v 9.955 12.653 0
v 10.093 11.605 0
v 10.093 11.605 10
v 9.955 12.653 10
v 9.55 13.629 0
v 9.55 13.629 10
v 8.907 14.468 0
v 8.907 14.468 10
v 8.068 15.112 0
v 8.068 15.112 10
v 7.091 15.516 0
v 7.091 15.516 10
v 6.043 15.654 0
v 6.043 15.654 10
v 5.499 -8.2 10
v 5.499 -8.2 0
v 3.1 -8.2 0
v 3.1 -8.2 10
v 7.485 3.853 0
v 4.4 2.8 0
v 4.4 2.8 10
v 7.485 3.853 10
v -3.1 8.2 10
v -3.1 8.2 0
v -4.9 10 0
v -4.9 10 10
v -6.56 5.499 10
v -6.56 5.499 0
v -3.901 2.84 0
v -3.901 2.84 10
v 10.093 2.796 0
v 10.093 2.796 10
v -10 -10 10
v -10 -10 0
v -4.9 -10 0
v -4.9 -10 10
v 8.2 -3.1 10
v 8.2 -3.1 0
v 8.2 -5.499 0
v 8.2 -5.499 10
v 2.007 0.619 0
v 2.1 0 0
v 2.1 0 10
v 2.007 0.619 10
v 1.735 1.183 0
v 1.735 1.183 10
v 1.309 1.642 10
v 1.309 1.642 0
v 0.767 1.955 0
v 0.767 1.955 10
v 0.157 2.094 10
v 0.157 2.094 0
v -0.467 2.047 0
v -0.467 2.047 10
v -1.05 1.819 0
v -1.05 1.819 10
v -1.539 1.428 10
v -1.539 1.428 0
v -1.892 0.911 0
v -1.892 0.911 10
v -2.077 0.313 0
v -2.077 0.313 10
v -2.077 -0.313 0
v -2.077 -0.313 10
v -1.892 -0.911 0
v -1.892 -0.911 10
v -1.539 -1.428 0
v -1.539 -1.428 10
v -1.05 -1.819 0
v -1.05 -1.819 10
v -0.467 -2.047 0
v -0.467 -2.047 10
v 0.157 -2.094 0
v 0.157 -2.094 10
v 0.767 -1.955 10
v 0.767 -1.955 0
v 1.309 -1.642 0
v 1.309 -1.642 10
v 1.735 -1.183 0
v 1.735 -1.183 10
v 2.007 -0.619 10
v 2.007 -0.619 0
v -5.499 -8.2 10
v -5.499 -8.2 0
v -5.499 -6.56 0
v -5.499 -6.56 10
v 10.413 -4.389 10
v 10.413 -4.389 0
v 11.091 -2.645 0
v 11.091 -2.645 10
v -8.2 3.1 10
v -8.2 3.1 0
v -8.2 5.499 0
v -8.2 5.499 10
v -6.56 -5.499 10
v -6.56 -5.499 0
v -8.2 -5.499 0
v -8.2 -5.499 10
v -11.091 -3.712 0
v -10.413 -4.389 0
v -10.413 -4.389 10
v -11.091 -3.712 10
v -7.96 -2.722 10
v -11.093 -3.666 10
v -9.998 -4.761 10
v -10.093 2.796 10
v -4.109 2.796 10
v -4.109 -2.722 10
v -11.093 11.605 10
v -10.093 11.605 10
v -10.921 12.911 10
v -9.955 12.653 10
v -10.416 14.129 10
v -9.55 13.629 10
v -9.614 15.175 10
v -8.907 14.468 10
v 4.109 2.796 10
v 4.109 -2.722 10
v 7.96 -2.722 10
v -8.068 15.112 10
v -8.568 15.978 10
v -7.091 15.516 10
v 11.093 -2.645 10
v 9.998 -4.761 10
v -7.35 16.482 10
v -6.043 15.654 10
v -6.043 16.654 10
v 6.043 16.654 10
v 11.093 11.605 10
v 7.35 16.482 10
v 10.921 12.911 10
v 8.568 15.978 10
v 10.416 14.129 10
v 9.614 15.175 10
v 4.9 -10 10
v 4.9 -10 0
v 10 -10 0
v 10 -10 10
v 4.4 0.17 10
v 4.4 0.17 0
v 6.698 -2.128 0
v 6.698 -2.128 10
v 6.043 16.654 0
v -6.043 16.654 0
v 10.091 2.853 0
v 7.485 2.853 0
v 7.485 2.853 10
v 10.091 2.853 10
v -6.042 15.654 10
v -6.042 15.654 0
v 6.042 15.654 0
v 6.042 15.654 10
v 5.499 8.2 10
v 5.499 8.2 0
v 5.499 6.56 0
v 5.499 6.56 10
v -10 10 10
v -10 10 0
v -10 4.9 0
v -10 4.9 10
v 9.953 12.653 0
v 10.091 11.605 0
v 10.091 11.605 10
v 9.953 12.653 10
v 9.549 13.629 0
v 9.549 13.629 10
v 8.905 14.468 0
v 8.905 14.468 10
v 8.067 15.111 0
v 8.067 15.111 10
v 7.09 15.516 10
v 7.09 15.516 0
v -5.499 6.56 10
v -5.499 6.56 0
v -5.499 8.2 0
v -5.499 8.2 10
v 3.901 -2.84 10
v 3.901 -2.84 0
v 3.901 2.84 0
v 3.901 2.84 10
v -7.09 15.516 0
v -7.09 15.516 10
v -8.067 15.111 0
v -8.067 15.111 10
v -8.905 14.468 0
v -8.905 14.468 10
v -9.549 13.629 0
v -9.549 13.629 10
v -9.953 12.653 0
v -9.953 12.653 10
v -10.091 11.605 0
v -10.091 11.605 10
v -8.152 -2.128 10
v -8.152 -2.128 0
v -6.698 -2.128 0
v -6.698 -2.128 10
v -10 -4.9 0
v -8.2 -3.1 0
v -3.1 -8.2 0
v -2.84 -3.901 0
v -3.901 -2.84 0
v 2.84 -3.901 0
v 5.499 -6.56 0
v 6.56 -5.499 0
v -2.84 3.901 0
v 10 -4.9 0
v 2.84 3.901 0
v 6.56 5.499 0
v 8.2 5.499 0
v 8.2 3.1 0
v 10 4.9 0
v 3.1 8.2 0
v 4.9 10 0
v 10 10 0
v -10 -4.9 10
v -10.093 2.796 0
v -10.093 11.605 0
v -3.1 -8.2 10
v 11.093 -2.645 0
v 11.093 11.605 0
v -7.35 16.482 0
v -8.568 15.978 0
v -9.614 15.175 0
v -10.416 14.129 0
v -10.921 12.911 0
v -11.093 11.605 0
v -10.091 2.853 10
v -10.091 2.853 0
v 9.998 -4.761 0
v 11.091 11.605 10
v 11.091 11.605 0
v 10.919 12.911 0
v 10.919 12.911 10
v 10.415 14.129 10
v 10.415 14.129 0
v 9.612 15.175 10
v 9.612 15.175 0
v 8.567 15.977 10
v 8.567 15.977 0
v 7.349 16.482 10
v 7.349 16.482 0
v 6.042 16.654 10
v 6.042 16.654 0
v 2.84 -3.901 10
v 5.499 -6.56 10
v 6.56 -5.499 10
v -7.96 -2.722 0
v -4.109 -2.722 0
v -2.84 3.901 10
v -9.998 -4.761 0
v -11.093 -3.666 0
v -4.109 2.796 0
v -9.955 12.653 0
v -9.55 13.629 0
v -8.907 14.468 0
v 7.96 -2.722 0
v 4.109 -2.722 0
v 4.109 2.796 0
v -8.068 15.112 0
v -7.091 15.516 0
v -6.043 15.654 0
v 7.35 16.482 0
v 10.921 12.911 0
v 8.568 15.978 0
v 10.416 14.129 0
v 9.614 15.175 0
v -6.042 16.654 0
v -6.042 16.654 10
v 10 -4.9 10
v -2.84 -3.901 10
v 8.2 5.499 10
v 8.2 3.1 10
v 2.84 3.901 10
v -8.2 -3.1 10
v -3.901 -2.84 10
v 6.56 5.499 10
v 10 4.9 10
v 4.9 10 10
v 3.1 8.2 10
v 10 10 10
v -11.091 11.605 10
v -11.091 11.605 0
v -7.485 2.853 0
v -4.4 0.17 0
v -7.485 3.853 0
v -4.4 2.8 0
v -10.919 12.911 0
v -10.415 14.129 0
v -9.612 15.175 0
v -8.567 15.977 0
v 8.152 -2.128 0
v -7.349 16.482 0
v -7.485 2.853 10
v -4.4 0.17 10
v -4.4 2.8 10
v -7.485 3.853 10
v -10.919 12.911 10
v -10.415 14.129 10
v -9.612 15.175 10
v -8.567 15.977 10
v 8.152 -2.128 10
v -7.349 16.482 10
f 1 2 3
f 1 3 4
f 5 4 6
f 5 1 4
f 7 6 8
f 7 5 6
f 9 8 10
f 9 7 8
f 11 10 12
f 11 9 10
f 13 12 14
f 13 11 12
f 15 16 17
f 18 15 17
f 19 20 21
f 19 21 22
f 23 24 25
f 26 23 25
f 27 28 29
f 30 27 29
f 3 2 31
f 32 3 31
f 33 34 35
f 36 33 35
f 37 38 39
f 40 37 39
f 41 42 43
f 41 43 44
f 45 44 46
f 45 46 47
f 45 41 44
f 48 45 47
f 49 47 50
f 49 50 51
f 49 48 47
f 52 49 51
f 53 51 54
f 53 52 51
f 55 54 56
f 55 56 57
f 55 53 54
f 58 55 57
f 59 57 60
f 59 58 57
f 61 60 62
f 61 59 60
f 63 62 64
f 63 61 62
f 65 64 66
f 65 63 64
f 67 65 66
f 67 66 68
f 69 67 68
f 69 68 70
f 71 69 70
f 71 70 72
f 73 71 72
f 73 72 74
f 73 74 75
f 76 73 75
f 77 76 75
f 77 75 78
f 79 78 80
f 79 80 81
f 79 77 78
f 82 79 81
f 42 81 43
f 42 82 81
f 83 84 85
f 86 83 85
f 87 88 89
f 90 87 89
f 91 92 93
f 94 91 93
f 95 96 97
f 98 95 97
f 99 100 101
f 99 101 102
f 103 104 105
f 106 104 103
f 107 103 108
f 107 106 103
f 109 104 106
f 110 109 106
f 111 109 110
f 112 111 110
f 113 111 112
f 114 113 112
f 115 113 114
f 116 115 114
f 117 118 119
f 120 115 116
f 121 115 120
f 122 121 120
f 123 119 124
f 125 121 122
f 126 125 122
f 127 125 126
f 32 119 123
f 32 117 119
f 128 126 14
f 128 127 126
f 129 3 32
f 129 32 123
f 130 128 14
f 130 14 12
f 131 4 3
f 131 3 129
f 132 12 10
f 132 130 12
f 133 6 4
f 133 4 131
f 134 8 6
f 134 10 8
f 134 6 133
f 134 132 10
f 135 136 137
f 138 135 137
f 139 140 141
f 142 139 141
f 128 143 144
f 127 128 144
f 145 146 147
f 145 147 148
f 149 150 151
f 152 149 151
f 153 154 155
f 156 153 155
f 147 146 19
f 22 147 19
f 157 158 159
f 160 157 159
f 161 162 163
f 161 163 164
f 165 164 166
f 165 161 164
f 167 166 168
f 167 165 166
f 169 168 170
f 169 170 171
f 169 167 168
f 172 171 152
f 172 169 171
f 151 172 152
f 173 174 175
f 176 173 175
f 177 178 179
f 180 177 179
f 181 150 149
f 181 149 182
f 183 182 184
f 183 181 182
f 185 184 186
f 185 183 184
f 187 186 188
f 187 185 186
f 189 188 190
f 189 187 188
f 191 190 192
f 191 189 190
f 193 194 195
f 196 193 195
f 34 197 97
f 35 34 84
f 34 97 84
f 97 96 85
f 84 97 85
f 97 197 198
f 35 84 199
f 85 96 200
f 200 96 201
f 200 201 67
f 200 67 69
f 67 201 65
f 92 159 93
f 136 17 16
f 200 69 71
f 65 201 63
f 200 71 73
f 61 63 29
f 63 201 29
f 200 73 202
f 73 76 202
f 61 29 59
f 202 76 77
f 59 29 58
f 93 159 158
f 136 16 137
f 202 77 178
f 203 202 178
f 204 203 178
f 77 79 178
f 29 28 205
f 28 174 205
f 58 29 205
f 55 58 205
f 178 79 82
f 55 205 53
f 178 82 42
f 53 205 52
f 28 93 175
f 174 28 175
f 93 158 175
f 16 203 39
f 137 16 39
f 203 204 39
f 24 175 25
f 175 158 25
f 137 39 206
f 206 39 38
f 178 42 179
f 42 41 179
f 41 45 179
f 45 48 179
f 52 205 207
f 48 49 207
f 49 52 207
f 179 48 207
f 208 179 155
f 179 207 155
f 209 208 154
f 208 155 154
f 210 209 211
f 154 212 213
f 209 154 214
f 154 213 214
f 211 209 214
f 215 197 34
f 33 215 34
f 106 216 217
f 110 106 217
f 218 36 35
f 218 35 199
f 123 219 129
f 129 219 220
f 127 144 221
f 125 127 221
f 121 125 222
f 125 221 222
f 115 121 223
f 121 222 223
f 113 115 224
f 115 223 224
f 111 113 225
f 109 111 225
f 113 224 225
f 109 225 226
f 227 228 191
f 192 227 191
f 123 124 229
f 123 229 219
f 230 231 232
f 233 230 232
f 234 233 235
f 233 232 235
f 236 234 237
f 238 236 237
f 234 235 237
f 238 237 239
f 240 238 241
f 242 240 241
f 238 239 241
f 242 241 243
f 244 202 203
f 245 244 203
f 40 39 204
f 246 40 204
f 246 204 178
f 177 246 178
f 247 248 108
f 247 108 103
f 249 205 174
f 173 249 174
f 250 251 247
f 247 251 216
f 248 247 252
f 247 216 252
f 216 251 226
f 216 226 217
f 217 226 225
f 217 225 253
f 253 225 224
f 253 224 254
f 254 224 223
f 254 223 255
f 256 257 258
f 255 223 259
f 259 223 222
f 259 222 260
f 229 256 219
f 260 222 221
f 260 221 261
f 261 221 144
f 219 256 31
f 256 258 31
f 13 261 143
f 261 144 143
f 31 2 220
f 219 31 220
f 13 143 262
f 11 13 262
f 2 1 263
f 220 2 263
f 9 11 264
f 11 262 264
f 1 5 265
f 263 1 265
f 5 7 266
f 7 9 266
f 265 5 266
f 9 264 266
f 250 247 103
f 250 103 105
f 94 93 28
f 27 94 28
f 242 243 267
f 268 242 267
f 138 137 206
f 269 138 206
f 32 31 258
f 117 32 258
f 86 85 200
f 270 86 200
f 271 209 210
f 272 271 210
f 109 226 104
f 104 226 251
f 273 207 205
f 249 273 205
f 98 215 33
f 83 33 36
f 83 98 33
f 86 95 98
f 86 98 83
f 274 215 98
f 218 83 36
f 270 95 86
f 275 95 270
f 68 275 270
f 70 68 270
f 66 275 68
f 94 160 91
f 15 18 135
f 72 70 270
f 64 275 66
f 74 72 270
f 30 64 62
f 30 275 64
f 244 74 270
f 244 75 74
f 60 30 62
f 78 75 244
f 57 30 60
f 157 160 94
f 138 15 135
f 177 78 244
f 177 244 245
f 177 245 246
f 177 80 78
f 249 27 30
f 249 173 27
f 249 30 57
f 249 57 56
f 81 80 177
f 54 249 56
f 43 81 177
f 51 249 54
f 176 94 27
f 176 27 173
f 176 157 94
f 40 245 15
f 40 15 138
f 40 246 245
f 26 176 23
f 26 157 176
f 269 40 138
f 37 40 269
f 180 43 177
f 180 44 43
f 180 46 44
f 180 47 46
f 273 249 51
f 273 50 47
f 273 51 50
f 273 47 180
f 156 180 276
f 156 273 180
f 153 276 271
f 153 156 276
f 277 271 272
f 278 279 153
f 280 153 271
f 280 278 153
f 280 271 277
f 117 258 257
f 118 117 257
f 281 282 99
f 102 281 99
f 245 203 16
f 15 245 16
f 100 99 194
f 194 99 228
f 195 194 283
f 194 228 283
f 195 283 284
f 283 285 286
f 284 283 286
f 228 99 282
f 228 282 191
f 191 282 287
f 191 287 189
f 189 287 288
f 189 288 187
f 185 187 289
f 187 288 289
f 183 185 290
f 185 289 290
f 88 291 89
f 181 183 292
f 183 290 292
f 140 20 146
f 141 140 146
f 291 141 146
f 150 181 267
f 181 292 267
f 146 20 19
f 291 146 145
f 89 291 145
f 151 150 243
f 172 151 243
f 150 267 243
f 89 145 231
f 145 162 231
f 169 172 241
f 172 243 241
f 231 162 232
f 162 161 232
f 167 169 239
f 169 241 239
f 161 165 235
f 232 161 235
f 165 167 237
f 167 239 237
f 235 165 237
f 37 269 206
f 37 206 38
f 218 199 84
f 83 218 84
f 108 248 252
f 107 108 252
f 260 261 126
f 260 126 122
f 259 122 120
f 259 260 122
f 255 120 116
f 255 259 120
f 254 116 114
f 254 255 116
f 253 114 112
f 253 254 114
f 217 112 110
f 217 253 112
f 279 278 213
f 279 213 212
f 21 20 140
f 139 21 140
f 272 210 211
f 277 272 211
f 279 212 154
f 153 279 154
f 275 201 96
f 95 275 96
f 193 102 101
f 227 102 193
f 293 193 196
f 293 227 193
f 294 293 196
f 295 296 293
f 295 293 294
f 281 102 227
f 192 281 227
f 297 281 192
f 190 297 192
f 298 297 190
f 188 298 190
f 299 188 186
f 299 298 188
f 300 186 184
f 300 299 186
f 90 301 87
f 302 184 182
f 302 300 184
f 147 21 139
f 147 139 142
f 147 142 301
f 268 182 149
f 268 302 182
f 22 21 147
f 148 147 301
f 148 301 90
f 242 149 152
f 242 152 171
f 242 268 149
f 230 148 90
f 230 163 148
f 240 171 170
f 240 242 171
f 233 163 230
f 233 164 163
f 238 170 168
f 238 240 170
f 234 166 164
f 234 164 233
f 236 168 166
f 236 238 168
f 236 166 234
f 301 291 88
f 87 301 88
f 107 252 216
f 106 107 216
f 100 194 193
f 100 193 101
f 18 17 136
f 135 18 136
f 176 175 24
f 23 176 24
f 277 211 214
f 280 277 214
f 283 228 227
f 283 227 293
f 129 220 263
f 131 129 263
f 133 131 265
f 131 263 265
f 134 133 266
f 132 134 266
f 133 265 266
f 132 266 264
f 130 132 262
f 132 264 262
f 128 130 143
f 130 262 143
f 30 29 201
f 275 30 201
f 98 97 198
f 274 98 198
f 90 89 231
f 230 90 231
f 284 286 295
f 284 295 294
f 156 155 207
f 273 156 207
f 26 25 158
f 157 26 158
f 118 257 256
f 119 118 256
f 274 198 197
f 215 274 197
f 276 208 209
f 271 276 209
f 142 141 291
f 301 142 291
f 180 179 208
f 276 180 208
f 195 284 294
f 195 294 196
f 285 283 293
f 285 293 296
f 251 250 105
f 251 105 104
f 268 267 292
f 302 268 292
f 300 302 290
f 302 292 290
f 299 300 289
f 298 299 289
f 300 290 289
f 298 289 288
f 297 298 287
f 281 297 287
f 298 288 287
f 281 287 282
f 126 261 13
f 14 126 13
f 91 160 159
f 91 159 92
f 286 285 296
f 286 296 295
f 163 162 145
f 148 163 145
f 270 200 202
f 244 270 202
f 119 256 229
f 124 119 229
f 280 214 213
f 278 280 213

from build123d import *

# Parameters (mm, degrees)
SKETCH_R      = 2.1
EXTRUDE_DEPTH = 10
PAD_DEPTH     = 10
PAD001_DEPTH  = 10


with BuildPart() as extrude_body:
    # Sketch → Extrude (new body)
    with BuildSketch(Plane.XY):
        Polygon((-2.84, 3.90066), (-5.49934, 6.56), (-5.49934, 8.2), (-3.1, 8.2), (-4.9, 10), (-10, 10), (-10, 4.9), (-8.2, 3.1), (-8.2, 5.49934), (-6.56, 5.49934), (-3.90066, 2.84), (-3.90066, 0), (-3.90066, -2.84), (-6.56, -5.49934), (-8.2, -5.49934), (-8.2, -3.1), (-10, -4.9), (-10, -10), (-4.9, -10), (-3.1, -8.2), (-5.49934, -8.2), (-5.49934, -6.56), (-2.84, -3.90066), (0, -3.90066), (2.84, -3.90066), (5.49934, -6.56), (5.49934, -8.2), (3.1, -8.2), (4.9, -10), (10, -10), (10, -4.9), (8.2, -3.1), (8.2, -5.49934), (6.56, -5.49934), (3.90066, -2.84), (3.90066, 0), (3.90066, 2.84), (6.56, 5.49934), (8.2, 5.49934), (8.2, 3.1), (10, 4.9), (10, 10), (4.9, 10), (3.1, 8.2), (5.49934, 8.2), (5.49934, 6.56), (2.84, 3.90066), (0, 3.90066), align=None)
        Circle(SKETCH_R, mode=Mode.SUBTRACT)
    extrude(amount=EXTRUDE_DEPTH)


with BuildPart() as body:
    # Sketch001 → Pad (new body)
    with BuildSketch(Plane.XY):
        with BuildLine():
            Line((-4.109357, 2.795605), (-10.092726, 2.795605))
            Line((-10.092726, 2.795605), (-10.092726, 11.604547))
            ThreePointArc((-6.043087, 15.654186), (-8.906614, 14.468074), (-10.092726, 11.604547))
            Line((-6.043087, 15.654186), (6.043087, 15.654186))
            ThreePointArc((10.092726, 11.604547), (8.906614, 14.468074), (6.043087, 15.654186))
            Line((10.092726, 11.604547), (10.092726, 2.795605))
            Line((10.092726, 2.795605), (4.109357, 2.795605))
            Line((4.109357, 2.795605), (4.109357, -2.722318))
            Line((4.109357, -2.722318), (7.960155, -2.722318))
            Line((7.960155, -2.722318), (9.998449, -4.760612))
            Line((9.998449, -4.760612), (11.092726, -2.644745))
            Line((11.092726, -2.644745), (11.092726, 11.604547))
            ThreePointArc((11.092726, 11.604547), (9.613721, 15.175181), (6.043087, 16.654186))
            Line((6.043087, 16.654186), (-6.043087, 16.654186))
            ThreePointArc((-6.043087, 16.654186), (-9.613721, 15.175181), (-11.092726, 11.604547))
            Line((-11.092726, 11.604547), (-11.092726, -3.666335))
            Line((-9.998449, -4.760612), (-11.092726, -3.666335))
            Line((-7.960155, -2.722318), (-9.998449, -4.760612))
            Line((-4.109357, -2.722318), (-7.960155, -2.722318))
            Line((-4.109357, -2.722318), (-4.109357, 2.795605))
        make_face()
    extrude(amount=PAD_DEPTH)


with BuildPart() as body001:
    # Sketch002 → Pad001 (new body)
    with BuildSketch(Plane.XY):
        with BuildLine():
            Line((-10.09111, 2.853201), (-10.09111, 11.604758))
            ThreePointArc((-6.042314, 15.653553), (-8.905245, 14.467688), (-10.09111, 11.604758))
            Line((-6.042314, 15.653553), (6.042314, 15.653553))
            ThreePointArc((10.09111, 11.604758), (8.905245, 14.467688), (6.042314, 15.653553))
            Line((10.09111, 11.604758), (10.09111, 2.853201))
            Line((7.485281, 2.853201), (10.09111, 2.853201))
            Line((7.485281, 2.853201), (7.485281, 3.853201))
            Line((4.4, 2.8), (7.485281, 3.853201))
            Line((4.4, 2.8), (4.4, 0.170135))
            Line((4.4, 0.170135), (6.698075, -2.12794))
            Line((6.698075, -2.12794), (8.151996, -2.12794))
            Line((8.151996, -2.12794), (10.413384, -4.389328))
            Line((10.413384, -4.389328), (11.09111, -2.644745))
            Line((11.09111, -2.644745), (11.09111, 11.604758))
            ThreePointArc((11.09111, 11.604758), (9.612352, 15.174795), (6.042314, 16.653553))
            Line((6.042314, 16.653553), (-6.042314, 16.653553))
            ThreePointArc((-6.042314, 16.653553), (-9.612352, 15.174795), (-11.09111, 11.604758))
            Line((-11.09111, 11.604758), (-11.09111, -3.711602))
            Line((-10.413384, -4.389328), (-11.09111, -3.711602))
            Line((-8.151996, -2.12794), (-10.413384, -4.389328))
            Line((-8.151996, -2.12794), (-6.698075, -2.12794))
            Line((-4.4, 0.170135), (-6.698075, -2.12794))
            Line((-4.4, 2.8), (-4.4, 0.170135))
            Line((-7.485281, 3.853201), (-4.4, 2.8))
            Line((-7.485281, 2.853201), (-7.485281, 3.853201))
            Line((-10.09111, 2.853201), (-7.485281, 2.853201))
        make_face()
    extrude(amount=PAD001_DEPTH)


solid = Compound([extrude_body.part, body.part, body001.part])
